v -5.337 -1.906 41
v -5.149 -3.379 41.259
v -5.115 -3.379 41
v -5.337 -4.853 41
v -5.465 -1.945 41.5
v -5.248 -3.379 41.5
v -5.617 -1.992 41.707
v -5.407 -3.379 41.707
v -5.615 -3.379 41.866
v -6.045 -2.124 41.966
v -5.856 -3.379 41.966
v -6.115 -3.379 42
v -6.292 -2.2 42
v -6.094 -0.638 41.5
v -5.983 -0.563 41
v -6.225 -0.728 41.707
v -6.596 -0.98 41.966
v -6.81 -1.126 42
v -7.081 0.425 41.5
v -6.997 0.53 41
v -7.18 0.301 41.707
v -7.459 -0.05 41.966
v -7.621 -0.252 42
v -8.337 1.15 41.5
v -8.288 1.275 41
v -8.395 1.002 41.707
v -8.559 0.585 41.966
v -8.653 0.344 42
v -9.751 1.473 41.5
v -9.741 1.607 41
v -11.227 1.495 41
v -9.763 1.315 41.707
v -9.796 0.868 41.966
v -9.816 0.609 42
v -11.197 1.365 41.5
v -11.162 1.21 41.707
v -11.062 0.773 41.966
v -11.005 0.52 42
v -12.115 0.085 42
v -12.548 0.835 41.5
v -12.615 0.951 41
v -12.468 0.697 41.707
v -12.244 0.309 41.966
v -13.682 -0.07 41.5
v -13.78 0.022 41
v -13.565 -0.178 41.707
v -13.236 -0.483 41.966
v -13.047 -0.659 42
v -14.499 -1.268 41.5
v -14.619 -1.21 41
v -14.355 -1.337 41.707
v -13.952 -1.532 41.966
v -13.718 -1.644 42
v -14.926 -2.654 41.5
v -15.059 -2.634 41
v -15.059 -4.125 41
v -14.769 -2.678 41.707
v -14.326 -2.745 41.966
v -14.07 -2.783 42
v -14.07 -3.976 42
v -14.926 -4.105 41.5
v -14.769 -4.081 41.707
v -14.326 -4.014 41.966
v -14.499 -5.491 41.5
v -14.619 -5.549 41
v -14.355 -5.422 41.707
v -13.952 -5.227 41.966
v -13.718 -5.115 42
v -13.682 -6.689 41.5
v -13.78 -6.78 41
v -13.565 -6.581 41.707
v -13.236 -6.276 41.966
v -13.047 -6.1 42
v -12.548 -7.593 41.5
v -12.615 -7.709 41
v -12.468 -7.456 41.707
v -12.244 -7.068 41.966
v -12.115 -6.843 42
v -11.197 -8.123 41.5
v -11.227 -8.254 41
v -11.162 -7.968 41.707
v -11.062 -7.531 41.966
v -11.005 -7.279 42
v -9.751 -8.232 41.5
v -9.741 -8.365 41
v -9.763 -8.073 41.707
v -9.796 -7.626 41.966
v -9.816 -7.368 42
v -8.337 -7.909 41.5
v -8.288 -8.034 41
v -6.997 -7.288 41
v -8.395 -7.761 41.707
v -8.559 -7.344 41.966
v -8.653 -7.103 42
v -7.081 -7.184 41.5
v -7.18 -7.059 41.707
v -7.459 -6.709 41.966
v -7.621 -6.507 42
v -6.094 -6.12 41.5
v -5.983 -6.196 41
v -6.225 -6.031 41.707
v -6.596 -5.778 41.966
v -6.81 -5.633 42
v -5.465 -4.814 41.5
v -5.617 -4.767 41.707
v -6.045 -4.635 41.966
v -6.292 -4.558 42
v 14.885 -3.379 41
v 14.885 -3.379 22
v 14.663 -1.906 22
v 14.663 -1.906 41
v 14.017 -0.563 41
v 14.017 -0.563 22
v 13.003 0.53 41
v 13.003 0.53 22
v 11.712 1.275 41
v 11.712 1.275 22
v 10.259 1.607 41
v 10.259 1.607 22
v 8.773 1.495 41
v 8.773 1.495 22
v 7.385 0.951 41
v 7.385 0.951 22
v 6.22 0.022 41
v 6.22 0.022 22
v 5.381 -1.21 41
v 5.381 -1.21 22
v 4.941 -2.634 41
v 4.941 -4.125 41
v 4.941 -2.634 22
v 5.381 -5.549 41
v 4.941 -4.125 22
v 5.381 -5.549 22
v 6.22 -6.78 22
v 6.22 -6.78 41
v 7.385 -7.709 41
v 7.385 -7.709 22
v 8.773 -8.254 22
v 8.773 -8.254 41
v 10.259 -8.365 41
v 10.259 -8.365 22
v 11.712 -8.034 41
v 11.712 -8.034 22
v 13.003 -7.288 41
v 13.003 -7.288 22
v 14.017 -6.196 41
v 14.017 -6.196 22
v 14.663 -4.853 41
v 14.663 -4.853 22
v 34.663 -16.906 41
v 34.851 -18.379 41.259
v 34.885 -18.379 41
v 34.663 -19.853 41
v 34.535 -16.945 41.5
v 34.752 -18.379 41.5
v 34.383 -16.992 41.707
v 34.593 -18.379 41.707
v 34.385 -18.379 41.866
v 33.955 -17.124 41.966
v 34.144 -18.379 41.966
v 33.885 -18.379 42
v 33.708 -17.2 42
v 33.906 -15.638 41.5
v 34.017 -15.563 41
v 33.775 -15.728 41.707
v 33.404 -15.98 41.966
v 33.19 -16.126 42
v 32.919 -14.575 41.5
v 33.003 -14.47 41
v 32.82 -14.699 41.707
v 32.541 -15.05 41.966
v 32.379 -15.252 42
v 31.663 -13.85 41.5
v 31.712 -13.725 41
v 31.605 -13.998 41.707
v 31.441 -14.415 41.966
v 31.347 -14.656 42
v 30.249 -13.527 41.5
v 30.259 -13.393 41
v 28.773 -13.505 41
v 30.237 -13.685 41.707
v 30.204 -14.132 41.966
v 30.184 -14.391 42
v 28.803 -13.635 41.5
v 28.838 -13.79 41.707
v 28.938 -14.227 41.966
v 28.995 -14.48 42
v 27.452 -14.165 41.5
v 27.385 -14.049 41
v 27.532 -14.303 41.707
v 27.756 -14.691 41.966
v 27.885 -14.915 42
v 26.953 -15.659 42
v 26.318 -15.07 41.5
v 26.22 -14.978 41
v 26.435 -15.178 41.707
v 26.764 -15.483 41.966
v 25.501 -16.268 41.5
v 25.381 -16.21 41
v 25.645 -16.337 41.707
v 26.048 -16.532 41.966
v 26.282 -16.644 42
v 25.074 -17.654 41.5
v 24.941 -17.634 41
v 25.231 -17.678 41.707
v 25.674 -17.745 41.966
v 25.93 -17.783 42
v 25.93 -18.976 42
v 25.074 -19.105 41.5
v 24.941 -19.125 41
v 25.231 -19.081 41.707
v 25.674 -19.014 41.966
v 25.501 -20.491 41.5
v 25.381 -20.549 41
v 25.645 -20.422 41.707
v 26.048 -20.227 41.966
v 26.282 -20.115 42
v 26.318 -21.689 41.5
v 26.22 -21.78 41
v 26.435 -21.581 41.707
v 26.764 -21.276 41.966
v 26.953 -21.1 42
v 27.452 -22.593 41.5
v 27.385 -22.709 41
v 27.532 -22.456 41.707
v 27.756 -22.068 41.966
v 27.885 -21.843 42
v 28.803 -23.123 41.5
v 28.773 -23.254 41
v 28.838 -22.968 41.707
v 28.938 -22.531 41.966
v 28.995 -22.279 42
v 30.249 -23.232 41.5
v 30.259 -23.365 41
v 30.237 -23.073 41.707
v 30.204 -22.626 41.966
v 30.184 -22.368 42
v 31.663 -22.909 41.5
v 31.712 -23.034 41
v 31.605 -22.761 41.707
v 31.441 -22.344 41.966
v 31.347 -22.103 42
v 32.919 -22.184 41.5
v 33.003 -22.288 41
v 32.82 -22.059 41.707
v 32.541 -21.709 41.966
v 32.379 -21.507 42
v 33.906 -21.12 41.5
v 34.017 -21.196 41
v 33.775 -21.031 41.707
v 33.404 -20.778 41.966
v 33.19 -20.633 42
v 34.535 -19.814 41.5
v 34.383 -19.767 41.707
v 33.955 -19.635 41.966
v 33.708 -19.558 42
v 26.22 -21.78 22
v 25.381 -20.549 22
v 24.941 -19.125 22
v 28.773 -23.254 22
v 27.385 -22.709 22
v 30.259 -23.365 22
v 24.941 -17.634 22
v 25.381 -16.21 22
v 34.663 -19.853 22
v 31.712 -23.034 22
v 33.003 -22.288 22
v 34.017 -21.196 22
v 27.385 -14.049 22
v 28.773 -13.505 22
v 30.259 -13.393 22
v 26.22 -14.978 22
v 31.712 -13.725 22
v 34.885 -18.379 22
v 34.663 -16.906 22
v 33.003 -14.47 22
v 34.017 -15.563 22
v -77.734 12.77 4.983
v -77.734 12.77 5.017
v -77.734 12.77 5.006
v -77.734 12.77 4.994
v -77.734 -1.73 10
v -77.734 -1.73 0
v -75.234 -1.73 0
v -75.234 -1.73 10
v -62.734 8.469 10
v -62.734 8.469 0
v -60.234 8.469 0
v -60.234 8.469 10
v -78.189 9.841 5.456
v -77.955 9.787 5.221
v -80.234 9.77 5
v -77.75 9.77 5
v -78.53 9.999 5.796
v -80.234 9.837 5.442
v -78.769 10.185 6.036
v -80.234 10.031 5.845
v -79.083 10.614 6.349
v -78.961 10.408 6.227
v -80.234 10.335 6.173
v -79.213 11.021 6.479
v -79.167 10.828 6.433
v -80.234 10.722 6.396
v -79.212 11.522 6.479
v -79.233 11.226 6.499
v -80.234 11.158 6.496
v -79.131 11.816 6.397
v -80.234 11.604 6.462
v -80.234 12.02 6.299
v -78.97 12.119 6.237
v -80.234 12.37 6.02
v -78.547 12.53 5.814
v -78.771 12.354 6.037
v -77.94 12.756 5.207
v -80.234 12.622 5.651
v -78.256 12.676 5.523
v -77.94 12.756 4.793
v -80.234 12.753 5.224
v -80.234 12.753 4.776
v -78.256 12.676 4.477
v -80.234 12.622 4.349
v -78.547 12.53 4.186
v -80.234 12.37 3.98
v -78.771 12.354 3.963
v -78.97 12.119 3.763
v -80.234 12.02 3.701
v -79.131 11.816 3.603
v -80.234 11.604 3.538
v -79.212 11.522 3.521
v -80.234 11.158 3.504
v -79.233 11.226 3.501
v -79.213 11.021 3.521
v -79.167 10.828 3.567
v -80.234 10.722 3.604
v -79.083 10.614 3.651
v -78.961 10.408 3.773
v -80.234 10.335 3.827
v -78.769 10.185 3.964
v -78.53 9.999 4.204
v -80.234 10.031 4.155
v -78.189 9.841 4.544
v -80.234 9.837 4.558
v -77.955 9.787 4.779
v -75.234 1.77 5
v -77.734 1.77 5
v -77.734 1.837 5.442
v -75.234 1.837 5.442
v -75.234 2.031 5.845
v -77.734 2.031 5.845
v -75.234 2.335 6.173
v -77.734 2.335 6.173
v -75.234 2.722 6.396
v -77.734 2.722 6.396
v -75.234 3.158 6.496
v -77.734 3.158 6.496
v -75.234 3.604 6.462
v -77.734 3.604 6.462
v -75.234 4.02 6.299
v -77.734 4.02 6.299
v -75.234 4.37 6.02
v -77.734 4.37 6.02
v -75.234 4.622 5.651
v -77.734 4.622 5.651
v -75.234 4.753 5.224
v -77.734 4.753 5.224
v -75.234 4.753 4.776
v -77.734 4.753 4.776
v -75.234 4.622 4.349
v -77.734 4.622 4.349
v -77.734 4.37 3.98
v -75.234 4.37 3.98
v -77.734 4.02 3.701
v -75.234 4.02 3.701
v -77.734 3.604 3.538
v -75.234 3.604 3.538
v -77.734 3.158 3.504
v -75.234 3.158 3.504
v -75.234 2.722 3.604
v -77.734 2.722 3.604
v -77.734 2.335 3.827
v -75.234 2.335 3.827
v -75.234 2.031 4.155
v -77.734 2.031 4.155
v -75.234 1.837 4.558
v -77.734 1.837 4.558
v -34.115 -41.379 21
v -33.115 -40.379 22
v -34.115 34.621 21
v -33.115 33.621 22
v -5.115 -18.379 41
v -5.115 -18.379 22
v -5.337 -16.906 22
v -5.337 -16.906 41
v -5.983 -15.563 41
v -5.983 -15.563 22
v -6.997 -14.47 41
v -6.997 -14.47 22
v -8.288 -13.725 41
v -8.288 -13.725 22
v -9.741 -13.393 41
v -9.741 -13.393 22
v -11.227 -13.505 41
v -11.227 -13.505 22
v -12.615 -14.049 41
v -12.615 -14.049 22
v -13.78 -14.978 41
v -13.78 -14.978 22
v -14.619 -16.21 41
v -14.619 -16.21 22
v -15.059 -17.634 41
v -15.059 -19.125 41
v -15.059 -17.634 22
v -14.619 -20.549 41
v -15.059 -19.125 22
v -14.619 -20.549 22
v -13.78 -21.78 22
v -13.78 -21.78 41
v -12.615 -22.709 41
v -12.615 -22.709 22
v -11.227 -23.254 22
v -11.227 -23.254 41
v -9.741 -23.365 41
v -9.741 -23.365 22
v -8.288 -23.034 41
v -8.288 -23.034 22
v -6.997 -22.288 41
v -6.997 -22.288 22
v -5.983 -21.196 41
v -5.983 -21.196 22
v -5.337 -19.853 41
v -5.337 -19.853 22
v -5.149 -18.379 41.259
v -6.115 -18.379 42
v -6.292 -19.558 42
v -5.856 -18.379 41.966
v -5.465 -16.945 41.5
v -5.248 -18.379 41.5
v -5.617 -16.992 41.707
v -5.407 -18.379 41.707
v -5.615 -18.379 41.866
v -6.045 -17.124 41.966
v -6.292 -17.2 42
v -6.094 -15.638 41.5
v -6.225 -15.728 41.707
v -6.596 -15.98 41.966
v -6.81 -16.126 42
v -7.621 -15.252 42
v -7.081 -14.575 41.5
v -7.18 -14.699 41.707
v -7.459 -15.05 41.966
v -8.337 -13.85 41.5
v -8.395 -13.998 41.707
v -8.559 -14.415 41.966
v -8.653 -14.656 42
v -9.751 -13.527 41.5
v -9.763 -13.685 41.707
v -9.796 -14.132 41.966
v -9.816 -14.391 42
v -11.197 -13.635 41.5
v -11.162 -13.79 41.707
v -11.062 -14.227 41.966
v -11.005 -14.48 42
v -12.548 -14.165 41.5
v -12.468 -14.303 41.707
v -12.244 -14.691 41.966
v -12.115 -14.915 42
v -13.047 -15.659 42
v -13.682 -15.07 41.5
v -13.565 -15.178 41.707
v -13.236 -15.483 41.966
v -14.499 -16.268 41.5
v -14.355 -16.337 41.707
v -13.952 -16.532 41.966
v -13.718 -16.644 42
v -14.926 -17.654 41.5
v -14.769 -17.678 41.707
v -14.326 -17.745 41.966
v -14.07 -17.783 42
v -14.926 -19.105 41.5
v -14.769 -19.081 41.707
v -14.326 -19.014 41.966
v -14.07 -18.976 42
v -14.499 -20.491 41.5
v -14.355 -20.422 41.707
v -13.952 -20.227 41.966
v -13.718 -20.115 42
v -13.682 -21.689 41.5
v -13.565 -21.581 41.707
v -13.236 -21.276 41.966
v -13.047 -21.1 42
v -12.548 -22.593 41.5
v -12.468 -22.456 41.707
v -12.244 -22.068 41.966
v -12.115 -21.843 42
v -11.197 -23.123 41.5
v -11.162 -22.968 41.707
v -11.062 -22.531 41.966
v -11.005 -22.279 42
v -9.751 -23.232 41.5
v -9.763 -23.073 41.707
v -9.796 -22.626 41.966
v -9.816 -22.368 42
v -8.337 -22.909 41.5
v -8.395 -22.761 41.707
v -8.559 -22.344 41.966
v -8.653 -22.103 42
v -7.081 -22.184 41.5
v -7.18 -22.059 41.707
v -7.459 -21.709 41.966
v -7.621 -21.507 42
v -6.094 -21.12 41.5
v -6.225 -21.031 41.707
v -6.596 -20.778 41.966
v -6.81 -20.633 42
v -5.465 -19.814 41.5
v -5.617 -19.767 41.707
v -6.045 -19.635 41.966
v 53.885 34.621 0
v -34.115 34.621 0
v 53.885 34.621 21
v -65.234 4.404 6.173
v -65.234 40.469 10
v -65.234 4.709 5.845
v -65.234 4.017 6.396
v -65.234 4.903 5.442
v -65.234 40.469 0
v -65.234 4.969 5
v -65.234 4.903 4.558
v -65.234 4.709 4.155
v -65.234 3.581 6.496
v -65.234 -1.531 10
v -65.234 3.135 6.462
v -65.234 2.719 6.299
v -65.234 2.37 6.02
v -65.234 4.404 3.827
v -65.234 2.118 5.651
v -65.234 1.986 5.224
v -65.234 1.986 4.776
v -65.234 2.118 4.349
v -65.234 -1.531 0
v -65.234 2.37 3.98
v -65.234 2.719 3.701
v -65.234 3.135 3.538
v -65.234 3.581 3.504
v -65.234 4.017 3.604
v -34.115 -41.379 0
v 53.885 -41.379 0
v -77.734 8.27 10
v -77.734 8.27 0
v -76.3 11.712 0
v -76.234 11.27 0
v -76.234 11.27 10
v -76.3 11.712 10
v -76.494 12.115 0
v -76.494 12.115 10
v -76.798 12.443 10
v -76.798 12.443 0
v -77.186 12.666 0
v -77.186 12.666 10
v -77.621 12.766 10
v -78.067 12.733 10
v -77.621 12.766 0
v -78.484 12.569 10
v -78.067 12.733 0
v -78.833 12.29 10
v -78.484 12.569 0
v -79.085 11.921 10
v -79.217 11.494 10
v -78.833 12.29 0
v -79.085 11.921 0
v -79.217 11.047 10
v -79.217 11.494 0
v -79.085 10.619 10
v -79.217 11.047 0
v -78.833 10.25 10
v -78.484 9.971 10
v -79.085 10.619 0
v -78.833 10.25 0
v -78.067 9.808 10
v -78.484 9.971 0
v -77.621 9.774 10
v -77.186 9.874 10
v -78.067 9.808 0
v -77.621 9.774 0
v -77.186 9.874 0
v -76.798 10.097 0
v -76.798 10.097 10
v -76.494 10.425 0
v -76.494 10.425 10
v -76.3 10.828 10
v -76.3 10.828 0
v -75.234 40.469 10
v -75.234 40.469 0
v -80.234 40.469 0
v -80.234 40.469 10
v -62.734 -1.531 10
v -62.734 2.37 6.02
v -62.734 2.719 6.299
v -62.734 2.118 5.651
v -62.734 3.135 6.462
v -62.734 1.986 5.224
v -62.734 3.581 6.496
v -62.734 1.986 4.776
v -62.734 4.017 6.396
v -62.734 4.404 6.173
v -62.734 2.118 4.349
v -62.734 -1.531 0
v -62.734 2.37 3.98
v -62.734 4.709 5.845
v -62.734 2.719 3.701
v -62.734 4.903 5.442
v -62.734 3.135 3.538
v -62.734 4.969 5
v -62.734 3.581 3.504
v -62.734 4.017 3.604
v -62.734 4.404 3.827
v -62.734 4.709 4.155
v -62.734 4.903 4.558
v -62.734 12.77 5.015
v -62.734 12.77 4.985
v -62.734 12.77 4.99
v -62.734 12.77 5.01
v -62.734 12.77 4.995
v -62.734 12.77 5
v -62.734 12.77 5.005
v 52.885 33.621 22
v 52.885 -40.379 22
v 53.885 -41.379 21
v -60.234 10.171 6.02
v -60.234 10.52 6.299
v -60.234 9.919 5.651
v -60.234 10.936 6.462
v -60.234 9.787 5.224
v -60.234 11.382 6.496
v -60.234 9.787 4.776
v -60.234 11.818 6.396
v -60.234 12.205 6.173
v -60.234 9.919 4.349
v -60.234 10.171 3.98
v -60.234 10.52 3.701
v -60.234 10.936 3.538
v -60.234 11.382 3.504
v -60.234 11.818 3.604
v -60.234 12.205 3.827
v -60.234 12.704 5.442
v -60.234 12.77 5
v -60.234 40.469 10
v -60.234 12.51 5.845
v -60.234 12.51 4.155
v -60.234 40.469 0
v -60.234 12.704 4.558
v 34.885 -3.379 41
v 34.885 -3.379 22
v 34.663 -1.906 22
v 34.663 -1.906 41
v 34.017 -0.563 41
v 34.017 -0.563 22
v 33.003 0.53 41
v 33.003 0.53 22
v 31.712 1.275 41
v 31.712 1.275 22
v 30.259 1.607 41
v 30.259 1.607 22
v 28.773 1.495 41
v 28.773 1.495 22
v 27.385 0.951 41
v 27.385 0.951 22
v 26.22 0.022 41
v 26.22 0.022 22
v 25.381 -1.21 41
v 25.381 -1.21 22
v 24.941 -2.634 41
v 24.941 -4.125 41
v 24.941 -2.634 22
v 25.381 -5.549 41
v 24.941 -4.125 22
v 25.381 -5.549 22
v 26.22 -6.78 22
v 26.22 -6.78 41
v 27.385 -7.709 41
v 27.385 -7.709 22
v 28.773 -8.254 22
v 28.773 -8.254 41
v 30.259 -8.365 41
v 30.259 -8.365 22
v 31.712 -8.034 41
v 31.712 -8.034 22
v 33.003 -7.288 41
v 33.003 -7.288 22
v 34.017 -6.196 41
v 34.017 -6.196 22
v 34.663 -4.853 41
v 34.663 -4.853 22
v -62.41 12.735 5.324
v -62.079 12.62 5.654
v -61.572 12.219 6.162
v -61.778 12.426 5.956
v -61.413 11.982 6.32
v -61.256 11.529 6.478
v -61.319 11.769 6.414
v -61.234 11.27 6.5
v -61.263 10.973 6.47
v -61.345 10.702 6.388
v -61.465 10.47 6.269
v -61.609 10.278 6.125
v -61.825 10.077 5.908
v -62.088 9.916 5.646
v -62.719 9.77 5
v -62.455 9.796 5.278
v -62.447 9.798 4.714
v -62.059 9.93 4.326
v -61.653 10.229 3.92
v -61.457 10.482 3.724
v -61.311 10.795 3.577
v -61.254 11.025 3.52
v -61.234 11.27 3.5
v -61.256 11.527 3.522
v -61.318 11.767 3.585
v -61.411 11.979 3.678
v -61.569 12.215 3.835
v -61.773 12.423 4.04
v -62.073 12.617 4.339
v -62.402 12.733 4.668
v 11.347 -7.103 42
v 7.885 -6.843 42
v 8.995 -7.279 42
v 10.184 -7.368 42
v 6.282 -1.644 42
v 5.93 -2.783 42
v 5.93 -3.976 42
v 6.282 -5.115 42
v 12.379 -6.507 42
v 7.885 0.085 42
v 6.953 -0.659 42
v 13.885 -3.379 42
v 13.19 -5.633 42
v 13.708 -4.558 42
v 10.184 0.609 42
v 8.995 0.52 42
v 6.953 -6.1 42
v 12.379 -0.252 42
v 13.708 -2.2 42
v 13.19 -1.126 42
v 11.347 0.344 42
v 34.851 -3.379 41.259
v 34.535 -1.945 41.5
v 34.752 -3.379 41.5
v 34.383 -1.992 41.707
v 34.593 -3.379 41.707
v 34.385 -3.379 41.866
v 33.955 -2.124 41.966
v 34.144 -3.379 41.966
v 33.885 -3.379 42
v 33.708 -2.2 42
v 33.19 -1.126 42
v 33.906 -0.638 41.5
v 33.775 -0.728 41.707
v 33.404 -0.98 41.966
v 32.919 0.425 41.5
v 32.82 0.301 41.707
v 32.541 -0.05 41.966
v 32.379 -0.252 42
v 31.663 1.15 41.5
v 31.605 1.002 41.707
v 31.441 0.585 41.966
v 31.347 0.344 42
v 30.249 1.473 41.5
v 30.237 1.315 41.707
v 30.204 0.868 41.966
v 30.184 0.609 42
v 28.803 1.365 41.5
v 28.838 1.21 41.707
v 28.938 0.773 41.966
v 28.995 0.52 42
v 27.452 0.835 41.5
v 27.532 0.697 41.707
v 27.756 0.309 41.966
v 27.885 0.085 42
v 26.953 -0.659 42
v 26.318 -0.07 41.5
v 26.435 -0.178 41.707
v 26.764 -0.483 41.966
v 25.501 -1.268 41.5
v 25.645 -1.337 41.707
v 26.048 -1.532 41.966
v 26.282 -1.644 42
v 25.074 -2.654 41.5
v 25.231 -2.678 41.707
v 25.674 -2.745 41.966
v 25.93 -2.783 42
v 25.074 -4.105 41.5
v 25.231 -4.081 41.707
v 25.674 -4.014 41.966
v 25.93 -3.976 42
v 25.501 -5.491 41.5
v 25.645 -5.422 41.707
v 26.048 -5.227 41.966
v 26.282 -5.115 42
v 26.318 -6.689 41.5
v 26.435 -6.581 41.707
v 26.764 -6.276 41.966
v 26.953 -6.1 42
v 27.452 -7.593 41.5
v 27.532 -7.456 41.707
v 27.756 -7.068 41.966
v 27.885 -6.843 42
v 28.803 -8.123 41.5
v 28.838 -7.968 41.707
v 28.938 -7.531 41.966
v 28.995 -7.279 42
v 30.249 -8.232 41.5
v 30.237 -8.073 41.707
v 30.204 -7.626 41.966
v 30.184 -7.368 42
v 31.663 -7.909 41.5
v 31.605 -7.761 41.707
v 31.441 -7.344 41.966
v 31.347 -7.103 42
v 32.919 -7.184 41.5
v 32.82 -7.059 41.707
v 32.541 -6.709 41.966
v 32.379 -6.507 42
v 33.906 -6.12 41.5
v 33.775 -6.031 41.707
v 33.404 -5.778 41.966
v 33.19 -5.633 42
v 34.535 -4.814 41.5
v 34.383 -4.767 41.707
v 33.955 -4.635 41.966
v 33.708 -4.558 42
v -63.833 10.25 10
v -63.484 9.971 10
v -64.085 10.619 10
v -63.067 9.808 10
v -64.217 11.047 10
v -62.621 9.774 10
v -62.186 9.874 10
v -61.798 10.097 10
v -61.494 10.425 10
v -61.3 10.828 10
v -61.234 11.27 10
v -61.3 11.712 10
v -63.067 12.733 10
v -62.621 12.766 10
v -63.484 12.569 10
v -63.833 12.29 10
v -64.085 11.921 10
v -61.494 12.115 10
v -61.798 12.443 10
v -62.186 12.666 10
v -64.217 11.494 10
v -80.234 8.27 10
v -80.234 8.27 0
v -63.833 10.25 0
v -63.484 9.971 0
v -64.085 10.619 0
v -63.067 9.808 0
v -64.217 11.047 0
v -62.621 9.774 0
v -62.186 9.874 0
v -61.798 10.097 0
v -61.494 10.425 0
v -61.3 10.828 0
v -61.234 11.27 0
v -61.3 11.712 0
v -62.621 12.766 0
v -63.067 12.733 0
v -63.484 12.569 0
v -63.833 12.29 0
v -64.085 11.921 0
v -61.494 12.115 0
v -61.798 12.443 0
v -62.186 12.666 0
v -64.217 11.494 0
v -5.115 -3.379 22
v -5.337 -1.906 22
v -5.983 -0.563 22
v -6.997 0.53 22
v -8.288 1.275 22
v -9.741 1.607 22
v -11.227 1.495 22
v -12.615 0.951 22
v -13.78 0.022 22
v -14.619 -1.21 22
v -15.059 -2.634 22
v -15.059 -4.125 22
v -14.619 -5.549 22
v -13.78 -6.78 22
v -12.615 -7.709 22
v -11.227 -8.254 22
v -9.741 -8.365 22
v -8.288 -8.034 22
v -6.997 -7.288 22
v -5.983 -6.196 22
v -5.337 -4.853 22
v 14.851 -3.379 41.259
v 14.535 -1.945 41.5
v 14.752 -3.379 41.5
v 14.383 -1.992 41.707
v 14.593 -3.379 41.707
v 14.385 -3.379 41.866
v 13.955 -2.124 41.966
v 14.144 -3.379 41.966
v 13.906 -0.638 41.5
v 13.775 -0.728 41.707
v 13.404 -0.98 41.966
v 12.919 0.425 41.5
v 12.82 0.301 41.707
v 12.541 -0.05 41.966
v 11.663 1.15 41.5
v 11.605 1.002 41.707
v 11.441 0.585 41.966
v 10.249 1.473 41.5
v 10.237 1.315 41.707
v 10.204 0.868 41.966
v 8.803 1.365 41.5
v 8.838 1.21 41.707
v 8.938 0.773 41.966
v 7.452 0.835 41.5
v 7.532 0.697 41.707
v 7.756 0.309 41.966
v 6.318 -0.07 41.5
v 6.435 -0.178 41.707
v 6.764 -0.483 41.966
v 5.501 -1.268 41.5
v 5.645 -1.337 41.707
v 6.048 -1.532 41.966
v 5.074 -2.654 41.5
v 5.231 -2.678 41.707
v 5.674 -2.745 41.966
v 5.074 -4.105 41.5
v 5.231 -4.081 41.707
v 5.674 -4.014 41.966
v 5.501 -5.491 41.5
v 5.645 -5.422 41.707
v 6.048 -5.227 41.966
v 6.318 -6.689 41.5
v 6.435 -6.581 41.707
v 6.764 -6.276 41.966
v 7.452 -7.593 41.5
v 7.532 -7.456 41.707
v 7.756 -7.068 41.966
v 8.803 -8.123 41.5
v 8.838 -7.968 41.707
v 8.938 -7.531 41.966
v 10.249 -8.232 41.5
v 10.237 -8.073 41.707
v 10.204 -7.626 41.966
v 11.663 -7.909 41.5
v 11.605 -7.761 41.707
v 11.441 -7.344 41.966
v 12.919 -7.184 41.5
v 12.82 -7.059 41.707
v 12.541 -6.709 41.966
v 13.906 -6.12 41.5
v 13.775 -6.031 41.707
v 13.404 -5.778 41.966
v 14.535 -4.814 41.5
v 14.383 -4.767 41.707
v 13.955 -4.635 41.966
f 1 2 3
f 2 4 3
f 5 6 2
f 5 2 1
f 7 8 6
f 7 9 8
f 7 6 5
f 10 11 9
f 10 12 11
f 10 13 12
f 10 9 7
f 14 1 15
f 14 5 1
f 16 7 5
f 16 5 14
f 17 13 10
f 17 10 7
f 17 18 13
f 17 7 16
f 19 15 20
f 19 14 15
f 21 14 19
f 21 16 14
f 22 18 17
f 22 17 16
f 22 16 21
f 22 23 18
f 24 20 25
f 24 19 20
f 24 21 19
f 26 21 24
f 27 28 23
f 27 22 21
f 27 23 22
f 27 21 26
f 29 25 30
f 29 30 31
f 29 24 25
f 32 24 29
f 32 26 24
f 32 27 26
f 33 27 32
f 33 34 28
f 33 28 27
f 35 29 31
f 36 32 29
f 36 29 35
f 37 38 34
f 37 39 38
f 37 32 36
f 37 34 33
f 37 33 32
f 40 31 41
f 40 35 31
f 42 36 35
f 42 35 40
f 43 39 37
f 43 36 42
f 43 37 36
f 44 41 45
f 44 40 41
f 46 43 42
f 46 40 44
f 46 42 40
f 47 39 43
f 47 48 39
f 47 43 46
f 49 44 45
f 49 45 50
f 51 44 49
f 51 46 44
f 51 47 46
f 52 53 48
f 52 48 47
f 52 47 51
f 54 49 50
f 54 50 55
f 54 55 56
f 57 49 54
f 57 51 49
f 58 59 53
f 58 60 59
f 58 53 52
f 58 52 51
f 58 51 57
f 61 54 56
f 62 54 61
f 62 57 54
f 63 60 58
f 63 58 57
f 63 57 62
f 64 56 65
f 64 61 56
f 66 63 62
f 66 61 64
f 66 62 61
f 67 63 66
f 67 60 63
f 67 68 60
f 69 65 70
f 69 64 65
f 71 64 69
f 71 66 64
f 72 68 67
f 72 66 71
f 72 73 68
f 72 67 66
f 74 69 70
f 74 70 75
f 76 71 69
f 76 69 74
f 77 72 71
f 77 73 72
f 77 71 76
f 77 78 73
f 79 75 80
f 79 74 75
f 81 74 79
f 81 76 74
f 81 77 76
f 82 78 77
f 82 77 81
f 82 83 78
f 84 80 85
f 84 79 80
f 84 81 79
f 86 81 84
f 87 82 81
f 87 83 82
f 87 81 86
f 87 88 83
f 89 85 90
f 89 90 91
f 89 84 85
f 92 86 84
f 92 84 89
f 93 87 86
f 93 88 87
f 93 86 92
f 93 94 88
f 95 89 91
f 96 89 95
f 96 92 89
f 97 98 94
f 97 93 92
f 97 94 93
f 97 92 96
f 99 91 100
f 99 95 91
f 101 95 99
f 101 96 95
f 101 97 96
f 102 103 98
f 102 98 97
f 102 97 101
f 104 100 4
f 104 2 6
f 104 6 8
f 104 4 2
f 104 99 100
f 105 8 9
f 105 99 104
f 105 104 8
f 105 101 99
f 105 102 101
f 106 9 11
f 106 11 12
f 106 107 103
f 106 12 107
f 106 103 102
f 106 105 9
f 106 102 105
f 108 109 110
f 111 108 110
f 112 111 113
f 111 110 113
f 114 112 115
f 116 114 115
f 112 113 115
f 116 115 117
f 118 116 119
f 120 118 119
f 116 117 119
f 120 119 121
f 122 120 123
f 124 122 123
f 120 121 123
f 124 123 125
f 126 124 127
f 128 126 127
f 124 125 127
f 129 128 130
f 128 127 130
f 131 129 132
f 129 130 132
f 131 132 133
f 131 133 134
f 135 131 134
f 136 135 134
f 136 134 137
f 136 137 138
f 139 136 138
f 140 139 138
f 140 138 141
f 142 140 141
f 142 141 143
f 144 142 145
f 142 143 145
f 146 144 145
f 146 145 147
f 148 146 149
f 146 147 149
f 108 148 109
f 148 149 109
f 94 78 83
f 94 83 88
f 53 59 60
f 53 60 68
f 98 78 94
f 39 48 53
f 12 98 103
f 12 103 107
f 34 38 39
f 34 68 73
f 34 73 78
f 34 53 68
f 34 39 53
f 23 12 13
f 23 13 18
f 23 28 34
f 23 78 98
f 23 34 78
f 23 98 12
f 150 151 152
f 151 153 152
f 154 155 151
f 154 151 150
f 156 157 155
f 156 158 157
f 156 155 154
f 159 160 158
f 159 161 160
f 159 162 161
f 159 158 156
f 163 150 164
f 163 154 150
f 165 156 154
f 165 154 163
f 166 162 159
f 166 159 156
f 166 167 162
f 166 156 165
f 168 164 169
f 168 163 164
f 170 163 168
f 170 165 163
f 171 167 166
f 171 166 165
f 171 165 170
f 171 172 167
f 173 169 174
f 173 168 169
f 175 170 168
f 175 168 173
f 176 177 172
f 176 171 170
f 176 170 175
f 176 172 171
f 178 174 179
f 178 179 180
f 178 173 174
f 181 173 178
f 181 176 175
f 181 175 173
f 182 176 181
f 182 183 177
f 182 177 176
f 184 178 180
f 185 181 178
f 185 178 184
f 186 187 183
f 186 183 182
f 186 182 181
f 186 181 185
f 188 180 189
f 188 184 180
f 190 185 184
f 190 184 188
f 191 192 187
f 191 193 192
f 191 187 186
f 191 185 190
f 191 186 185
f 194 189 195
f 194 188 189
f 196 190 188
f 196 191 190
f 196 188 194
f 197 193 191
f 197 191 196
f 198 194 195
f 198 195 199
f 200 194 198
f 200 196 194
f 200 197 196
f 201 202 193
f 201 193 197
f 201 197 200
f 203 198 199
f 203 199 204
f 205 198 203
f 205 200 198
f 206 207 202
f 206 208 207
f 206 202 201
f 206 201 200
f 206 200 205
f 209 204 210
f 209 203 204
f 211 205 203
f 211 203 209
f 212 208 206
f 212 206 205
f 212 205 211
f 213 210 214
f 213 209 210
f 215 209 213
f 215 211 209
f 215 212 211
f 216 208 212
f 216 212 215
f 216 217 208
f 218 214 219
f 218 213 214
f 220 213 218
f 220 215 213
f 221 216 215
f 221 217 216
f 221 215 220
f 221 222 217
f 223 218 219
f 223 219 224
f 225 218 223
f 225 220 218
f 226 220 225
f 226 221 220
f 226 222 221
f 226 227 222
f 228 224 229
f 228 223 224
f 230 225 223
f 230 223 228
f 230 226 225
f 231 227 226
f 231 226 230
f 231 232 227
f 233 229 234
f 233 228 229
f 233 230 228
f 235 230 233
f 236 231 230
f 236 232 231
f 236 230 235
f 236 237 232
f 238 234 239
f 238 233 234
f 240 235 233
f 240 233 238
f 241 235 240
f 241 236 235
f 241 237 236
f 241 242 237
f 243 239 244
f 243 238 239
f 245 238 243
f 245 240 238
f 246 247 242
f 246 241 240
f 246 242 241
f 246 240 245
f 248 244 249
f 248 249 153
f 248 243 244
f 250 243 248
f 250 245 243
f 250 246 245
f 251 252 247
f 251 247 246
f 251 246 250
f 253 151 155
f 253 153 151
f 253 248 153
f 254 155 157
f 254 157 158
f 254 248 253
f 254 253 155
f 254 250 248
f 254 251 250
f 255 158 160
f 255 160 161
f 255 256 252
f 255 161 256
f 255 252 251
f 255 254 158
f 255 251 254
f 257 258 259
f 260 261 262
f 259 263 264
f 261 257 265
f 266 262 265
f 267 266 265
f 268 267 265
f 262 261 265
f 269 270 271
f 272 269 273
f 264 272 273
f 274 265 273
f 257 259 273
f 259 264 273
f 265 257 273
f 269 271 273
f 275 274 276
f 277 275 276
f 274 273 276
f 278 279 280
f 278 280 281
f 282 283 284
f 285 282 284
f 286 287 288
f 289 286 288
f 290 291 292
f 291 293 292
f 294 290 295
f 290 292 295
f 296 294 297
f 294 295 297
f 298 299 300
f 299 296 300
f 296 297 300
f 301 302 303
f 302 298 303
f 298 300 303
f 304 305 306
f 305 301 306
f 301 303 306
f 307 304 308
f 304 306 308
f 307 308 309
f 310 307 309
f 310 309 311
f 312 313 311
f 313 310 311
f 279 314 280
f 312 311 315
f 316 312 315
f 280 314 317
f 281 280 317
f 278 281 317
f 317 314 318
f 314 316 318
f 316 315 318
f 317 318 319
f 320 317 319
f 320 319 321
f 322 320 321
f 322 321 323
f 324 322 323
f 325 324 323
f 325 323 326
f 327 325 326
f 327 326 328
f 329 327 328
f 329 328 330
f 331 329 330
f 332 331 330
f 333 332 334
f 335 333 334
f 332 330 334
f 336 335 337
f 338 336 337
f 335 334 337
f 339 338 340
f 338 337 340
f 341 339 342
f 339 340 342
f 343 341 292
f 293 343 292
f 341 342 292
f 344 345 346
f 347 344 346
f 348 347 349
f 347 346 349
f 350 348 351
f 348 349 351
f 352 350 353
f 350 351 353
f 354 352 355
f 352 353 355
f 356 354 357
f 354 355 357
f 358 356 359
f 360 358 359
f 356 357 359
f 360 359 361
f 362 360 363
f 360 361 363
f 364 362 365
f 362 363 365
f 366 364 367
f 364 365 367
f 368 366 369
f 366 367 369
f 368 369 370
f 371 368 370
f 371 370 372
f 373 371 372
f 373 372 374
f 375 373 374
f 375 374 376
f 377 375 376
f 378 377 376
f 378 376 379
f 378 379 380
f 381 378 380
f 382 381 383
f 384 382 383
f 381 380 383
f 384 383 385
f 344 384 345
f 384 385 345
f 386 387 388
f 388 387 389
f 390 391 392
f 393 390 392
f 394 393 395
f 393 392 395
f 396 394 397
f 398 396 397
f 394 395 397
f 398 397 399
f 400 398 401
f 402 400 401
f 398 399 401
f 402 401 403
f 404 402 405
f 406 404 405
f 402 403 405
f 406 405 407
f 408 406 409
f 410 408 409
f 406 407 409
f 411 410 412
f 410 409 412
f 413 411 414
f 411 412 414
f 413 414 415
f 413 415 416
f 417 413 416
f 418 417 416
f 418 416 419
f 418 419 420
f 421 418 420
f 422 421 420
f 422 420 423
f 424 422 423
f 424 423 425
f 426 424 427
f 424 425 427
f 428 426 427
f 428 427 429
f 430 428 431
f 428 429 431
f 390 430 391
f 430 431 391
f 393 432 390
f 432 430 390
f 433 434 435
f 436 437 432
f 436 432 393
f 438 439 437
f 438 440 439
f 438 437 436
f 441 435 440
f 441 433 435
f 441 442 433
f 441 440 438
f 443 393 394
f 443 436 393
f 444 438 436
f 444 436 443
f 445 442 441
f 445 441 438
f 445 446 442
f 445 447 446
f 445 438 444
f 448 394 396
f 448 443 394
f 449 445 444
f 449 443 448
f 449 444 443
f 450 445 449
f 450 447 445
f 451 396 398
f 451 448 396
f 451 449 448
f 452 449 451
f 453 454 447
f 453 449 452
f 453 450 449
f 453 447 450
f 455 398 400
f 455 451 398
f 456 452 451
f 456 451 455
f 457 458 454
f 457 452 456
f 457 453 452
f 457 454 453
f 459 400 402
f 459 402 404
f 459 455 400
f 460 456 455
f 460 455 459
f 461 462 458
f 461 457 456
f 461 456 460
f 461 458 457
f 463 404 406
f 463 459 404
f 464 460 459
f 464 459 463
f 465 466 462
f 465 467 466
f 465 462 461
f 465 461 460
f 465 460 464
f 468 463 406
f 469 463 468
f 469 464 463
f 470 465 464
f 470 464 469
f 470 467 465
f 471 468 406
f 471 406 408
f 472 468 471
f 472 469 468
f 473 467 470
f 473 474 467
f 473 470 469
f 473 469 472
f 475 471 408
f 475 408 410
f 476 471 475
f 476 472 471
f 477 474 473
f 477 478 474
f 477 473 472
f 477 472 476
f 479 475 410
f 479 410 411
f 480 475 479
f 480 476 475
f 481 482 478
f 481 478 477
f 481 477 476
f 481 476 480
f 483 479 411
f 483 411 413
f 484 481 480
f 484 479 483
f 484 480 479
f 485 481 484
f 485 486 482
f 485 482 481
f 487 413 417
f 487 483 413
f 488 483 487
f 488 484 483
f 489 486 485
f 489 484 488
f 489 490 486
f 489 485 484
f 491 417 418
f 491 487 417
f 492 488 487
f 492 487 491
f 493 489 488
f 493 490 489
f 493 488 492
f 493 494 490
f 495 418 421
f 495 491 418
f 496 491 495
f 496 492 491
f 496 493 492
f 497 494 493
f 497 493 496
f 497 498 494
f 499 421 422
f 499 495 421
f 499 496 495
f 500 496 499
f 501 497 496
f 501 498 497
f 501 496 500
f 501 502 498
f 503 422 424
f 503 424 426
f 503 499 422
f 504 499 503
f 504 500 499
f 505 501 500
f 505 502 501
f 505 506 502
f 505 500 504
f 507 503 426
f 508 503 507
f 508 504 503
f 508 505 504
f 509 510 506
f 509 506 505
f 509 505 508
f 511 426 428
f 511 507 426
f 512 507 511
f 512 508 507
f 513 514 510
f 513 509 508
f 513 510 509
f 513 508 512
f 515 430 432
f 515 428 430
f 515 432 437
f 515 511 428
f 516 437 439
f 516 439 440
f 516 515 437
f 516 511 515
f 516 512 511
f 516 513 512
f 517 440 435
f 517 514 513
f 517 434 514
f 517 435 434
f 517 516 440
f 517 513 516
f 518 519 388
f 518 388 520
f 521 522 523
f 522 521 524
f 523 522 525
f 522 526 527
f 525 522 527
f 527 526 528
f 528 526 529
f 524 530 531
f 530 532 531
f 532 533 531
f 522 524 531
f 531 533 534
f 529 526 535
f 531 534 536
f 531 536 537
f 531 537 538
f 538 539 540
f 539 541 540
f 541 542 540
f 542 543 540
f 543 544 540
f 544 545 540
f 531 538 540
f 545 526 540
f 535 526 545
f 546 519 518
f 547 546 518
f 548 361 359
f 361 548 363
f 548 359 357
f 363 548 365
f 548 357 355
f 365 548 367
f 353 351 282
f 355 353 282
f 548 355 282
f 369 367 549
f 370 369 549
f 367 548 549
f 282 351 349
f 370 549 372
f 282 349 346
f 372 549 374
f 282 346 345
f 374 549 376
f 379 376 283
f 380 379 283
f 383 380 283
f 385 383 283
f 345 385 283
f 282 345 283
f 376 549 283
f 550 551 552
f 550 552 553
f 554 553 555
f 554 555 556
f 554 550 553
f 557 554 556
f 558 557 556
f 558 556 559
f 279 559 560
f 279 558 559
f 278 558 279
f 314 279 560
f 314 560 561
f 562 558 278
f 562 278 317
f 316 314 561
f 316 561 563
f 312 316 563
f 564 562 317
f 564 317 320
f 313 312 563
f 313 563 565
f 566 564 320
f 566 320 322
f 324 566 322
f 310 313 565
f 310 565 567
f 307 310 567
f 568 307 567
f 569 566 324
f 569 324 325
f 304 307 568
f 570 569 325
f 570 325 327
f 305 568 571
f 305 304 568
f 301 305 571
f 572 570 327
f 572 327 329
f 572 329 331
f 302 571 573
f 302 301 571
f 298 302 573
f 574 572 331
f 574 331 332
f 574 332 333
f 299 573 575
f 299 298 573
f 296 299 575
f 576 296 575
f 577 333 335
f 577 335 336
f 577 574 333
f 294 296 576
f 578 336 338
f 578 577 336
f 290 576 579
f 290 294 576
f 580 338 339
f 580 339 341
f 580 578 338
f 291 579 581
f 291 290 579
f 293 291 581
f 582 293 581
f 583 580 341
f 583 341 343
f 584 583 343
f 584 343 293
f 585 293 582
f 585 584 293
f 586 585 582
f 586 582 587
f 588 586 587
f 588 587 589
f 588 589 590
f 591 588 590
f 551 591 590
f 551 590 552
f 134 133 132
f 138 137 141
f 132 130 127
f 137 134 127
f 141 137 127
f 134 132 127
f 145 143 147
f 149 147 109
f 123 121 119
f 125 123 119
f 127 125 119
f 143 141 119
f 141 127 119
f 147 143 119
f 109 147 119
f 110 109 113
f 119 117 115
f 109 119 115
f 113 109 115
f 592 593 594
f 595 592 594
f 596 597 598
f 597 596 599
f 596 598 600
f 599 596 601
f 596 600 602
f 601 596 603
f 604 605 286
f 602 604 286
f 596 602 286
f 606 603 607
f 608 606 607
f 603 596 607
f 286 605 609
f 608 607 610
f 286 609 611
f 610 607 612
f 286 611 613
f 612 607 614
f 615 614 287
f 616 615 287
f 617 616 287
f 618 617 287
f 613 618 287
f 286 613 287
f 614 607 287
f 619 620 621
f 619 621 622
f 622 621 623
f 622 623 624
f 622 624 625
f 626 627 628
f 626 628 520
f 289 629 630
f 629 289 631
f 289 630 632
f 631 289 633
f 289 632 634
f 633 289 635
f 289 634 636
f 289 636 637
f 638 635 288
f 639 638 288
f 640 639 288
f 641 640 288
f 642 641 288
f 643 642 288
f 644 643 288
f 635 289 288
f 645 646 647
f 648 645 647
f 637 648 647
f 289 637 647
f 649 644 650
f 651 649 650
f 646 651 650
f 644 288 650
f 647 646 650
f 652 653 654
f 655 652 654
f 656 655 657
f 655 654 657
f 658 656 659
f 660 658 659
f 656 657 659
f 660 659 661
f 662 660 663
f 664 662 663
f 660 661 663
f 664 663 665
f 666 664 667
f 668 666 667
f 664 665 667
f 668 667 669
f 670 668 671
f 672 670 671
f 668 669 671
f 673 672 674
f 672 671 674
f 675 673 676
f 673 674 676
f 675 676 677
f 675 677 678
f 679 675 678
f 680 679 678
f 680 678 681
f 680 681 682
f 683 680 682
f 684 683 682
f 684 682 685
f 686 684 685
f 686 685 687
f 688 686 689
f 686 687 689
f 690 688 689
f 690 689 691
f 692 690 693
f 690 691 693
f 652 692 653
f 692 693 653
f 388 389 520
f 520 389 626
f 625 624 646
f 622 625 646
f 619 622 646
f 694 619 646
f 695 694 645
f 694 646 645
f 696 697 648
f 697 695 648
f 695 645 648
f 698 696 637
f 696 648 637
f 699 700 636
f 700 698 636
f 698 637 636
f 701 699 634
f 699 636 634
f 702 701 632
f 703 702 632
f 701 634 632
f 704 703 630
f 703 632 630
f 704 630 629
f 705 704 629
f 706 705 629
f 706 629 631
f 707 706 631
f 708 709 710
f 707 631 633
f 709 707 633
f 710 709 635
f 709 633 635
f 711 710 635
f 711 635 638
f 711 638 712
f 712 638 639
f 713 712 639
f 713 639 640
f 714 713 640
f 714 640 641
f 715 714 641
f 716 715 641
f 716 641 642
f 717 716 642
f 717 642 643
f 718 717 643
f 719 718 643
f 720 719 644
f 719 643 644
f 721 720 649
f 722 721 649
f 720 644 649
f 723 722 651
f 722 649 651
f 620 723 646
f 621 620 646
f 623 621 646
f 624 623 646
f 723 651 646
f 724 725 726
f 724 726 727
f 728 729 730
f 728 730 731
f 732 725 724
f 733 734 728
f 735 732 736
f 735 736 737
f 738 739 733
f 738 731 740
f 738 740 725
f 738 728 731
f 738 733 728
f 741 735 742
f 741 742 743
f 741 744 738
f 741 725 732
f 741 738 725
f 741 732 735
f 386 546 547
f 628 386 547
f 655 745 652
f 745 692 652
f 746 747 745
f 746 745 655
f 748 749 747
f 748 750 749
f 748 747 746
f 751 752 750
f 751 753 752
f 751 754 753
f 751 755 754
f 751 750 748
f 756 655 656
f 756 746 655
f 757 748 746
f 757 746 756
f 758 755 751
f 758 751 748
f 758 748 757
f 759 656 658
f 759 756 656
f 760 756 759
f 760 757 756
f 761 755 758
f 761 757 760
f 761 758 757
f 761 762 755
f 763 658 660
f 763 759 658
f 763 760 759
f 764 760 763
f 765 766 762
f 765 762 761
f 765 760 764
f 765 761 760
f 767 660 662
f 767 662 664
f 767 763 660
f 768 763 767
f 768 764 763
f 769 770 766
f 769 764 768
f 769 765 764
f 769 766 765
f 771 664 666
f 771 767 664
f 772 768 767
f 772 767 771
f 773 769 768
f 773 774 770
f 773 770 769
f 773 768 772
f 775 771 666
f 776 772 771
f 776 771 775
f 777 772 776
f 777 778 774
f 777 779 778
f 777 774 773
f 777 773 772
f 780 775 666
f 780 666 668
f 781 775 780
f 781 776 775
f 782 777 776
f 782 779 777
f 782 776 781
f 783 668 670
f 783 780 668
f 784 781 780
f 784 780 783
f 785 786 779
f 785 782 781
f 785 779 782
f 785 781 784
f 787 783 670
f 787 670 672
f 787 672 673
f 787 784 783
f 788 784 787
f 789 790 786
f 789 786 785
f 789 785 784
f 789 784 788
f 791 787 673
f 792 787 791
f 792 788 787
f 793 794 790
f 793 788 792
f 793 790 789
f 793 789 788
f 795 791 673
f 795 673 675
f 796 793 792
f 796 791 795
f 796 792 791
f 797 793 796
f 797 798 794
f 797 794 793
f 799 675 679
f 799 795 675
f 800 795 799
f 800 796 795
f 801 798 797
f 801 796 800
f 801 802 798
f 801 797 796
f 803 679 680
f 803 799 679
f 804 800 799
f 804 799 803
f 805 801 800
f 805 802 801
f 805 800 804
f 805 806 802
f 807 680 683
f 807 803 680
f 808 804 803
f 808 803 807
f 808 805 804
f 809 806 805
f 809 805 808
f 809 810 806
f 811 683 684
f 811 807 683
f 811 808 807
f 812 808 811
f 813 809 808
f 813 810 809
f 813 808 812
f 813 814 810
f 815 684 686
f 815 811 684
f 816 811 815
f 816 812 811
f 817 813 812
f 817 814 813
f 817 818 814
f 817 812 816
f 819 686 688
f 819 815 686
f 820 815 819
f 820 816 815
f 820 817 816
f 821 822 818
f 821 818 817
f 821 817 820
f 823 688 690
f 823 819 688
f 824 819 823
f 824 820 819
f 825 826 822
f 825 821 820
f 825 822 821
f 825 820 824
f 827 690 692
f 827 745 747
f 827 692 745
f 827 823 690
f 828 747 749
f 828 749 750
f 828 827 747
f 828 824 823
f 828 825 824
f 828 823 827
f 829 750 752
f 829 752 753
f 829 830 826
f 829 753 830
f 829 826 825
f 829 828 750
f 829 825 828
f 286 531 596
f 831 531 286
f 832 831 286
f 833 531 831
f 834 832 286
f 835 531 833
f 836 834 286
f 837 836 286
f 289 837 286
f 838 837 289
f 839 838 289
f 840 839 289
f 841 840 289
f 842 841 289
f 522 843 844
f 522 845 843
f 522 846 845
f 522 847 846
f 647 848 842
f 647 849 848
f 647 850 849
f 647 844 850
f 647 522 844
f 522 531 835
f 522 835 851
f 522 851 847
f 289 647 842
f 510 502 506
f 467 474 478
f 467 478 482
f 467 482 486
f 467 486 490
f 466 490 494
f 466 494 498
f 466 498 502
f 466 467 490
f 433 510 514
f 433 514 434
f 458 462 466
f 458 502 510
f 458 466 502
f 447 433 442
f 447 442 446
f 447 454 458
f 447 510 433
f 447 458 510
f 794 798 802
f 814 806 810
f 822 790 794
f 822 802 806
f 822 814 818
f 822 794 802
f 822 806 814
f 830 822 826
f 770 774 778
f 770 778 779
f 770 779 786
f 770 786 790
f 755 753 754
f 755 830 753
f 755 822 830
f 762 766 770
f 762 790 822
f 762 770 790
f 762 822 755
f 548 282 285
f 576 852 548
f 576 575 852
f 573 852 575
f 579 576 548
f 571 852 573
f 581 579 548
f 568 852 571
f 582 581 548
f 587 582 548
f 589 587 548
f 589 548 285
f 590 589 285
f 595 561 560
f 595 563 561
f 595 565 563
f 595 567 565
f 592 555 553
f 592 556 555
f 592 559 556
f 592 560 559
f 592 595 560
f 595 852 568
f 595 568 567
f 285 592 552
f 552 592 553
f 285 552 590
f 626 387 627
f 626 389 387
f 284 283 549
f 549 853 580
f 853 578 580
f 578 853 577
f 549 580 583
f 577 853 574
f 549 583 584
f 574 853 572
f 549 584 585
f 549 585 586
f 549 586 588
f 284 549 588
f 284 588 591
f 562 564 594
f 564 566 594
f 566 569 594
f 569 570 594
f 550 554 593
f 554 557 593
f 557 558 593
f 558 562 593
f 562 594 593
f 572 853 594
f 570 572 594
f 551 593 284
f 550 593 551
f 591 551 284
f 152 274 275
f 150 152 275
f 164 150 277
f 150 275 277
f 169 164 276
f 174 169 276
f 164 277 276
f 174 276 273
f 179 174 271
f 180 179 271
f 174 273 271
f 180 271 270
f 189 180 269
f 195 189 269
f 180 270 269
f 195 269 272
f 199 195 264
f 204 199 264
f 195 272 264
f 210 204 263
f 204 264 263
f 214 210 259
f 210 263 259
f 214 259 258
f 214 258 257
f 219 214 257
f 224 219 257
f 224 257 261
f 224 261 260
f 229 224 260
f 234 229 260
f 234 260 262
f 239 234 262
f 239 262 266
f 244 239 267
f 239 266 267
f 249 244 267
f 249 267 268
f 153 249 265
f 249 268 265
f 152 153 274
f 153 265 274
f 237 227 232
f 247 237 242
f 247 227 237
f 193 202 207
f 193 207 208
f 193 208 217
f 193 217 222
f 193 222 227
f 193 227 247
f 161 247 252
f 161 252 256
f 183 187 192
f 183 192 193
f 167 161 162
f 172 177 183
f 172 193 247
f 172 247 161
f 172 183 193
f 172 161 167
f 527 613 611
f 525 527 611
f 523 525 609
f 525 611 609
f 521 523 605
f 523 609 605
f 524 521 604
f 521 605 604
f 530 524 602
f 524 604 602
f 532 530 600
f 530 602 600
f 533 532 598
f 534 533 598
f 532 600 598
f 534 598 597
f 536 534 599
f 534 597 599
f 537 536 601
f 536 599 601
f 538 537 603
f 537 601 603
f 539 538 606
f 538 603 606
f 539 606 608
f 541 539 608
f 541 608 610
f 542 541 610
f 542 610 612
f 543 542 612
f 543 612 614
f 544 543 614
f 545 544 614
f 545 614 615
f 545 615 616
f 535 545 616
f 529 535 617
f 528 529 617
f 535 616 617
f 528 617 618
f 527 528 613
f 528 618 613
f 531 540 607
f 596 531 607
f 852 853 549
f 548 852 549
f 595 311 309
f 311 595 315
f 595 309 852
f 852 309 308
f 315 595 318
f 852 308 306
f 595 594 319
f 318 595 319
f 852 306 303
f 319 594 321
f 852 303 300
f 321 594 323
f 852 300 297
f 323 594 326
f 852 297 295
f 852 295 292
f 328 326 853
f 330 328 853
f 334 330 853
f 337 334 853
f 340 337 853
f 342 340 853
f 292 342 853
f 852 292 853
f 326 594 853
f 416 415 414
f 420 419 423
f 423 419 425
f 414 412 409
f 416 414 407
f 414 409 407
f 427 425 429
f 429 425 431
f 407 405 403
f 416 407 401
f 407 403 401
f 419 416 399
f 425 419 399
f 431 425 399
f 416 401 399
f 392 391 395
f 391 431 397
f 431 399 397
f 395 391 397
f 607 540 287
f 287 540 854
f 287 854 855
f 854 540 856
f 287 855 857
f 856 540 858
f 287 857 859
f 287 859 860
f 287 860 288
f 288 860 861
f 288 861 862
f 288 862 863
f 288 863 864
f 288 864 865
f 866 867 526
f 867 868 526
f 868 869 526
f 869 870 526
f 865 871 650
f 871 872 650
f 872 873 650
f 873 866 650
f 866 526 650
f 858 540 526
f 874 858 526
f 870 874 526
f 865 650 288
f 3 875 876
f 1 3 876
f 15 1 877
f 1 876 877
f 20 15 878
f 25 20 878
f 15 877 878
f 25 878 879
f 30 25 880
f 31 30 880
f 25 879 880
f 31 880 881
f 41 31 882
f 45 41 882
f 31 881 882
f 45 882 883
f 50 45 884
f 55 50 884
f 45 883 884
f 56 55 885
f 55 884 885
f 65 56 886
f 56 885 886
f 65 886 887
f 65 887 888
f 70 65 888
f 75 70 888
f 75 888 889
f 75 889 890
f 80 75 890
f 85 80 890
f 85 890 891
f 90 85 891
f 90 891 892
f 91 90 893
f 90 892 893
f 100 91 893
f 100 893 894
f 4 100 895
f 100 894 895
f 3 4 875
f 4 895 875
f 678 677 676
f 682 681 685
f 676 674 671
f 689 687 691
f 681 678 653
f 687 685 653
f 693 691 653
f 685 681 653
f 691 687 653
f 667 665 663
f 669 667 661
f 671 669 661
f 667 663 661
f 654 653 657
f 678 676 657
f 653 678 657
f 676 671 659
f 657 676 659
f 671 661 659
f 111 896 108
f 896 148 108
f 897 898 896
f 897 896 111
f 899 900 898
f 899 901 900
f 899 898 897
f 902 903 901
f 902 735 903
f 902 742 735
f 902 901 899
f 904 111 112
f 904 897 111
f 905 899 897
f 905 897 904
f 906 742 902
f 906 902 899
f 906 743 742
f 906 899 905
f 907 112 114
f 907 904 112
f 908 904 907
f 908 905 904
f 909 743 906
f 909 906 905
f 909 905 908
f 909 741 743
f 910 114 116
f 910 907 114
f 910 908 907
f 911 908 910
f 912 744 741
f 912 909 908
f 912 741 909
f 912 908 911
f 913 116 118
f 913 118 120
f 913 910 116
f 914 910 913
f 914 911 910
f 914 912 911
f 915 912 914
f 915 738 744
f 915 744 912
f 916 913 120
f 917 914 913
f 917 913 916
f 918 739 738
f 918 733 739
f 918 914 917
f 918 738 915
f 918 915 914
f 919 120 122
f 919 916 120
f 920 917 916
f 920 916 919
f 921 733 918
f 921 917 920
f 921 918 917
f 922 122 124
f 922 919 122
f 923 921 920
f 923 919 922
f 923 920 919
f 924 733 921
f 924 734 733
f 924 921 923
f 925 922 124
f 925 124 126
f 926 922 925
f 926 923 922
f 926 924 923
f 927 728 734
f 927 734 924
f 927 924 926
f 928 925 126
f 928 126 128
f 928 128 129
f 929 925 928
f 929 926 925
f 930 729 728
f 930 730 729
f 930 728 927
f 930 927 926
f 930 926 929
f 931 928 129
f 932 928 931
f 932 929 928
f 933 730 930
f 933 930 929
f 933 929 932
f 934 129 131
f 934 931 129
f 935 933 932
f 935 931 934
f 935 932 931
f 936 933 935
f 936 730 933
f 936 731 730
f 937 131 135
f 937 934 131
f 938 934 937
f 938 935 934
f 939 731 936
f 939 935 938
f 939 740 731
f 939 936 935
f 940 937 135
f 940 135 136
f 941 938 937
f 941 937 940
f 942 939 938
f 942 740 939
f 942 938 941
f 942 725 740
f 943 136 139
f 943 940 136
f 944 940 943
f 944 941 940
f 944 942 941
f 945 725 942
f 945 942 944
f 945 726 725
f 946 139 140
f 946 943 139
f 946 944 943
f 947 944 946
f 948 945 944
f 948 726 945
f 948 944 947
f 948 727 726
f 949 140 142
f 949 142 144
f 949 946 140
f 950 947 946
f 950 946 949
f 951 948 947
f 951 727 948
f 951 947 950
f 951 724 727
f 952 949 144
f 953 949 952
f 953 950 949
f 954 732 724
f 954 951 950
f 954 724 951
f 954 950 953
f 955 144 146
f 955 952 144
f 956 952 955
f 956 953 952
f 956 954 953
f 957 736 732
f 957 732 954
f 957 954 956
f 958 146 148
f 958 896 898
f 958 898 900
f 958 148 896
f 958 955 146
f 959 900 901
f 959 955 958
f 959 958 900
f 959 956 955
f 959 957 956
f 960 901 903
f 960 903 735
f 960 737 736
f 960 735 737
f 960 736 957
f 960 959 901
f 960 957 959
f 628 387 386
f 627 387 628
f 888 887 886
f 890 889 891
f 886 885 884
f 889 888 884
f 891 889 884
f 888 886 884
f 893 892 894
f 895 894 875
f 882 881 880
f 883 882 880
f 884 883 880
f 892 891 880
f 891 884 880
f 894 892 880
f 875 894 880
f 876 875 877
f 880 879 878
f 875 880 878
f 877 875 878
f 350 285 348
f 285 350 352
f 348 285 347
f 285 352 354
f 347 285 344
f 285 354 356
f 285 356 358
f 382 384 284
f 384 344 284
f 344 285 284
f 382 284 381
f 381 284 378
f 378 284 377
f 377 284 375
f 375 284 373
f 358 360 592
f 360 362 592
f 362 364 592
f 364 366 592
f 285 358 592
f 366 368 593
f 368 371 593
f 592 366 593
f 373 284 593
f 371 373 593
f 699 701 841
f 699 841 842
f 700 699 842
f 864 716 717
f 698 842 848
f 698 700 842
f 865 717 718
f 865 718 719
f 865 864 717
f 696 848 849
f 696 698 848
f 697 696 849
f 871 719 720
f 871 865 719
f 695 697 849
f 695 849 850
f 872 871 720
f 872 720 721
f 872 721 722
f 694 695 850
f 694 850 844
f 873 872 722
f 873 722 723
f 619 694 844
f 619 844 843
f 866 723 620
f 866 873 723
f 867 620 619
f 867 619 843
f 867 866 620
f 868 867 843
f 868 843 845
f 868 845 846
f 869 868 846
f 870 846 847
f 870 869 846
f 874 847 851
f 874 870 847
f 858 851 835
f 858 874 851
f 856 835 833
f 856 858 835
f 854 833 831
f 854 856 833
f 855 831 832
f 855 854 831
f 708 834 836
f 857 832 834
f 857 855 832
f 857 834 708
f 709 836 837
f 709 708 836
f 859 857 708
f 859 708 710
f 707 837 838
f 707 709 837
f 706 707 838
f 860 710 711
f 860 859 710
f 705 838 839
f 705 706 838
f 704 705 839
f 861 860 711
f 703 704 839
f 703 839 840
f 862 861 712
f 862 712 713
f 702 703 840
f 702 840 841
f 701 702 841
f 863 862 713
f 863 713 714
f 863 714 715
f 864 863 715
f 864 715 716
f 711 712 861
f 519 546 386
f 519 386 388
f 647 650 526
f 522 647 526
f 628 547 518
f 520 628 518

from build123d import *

# Parameters (mm, degrees)
F0_W      = 88
F0_H      = 76
F1_DEPTH  = 22
F2_SIZE   = 1
F3_R      = 5
F4_DEPTH  = 20
F5_R      = 1
F6_R      = 1.5
F7_DEPTH  = 10
F8_R      = 1.5
F9_DEPTH  = 2.5
F10_R     = 1.5
F11_DEPTH = 2.5
F12_R     = 1.5
F13_DEPTH = 2.5
F14_R     = 1.5
F15_DEPTH = 2.5


with BuildPart() as f1:
    # F0 (on Top) → F1 (new body)
    with BuildSketch(Plane.XY):
        with Locations((9.885495, -3.379333)):
            Rectangle(F0_W, F0_H)
    extrude(amount=F1_DEPTH)

    # F2
    f2_edges = [f1.edges().sort_by_distance(p)[0] for p in [
        (9.885495, -41.379333, 22),
        (-34.114505, -3.379333, 22),
        (9.885495, 34.620667, 22),
        (53.885495, -3.379333, 22),
    ]]
    chamfer(f2_edges, length=F2_SIZE)


with BuildPart() as f4:
    # F3 (on face) → F4 (new body)
    with BuildSketch(Plane.XY.offset(22)):
        with Locations((-10.114505, -3.379333)):
            Circle(F3_R)
        with Locations((9.885495, -3.379333)):
            Circle(F3_R)
        with Locations((29.885495, -3.379333)):
            Circle(F3_R)
        with Locations((29.885495, -18.379333)):
            Circle(F3_R)
        with Locations((-10.114505, -18.379333)):
            Circle(F3_R)
    extrude(amount=F4_DEPTH)

    # F5
    f5_edges = [f4.edges().sort_by_distance(p)[0] for p in [
        (-15.114505, -3.379333, 42),
        (-15.114505, -18.379333, 42),
        (4.885495, -3.379333, 42),
        (24.885495, -3.379333, 42),
        (24.885495, -18.379333, 42),
    ]]
    fillet(f5_edges, radius=F5_R)


with BuildPart() as f7:
    # F6 (on Top) → F7 (new body)
    with BuildSketch(Plane.XY):
        Polygon((-60.23356, 40.469234), (-65.23356, 40.469234), (-65.23356, -1.530766), (-62.73356, -1.530766), (-62.73356, 8.469234), (-60.23356, 8.469234), align=None)
        with Locations((-62.73356, 11.27014)):
            Circle(F6_R, mode=Mode.SUBTRACT)
        Polygon((-75.23356, 40.469234), (-80.23356, 40.469234), (-80.23356, 8.27014), (-77.73356, 8.27014), (-77.73356, -1.72986), (-75.23356, -1.72986), align=None)
        with Locations((-77.73356, 11.27014)):
            Circle(F6_R, mode=Mode.SUBTRACT)
    extrude(amount=F7_DEPTH)

    # F8 (on face) → F9 (cut)
    with BuildSketch(Plane(origin=(-80.23356, 0, 0), x_dir=(0, -1, 0), z_dir=(-1, 0, 0))):
        with Locations((-11.270235, 5)):
            Circle(F8_R)
    extrude(amount=-F9_DEPTH, mode=Mode.SUBTRACT)

    # F10 (on face) → F11 (cut)
    with BuildSketch(Plane(origin=(-77.73356, 0, 0), x_dir=(0, -1, 0), z_dir=(-1, 0, 0))):
        with Locations((-3.27014, 5)):
            Circle(F10_R)
    extrude(amount=-F11_DEPTH, mode=Mode.SUBTRACT)

    # F12 (on face) → F13 (cut)
    with BuildSketch(Plane.YZ.offset(-60.23356)):
        with Locations((11.270214, 5)):
            Circle(F12_R)
    extrude(amount=-F13_DEPTH, mode=Mode.SUBTRACT)

    # F14 (on face) → F15 (cut)
    with BuildSketch(Plane.YZ.offset(-62.73356)):
        with Locations((3.469234, 5)):
            Circle(F14_R)
    extrude(amount=-F15_DEPTH, mode=Mode.SUBTRACT)


solid = Compound([f1.part, f4.part, f7.part])
